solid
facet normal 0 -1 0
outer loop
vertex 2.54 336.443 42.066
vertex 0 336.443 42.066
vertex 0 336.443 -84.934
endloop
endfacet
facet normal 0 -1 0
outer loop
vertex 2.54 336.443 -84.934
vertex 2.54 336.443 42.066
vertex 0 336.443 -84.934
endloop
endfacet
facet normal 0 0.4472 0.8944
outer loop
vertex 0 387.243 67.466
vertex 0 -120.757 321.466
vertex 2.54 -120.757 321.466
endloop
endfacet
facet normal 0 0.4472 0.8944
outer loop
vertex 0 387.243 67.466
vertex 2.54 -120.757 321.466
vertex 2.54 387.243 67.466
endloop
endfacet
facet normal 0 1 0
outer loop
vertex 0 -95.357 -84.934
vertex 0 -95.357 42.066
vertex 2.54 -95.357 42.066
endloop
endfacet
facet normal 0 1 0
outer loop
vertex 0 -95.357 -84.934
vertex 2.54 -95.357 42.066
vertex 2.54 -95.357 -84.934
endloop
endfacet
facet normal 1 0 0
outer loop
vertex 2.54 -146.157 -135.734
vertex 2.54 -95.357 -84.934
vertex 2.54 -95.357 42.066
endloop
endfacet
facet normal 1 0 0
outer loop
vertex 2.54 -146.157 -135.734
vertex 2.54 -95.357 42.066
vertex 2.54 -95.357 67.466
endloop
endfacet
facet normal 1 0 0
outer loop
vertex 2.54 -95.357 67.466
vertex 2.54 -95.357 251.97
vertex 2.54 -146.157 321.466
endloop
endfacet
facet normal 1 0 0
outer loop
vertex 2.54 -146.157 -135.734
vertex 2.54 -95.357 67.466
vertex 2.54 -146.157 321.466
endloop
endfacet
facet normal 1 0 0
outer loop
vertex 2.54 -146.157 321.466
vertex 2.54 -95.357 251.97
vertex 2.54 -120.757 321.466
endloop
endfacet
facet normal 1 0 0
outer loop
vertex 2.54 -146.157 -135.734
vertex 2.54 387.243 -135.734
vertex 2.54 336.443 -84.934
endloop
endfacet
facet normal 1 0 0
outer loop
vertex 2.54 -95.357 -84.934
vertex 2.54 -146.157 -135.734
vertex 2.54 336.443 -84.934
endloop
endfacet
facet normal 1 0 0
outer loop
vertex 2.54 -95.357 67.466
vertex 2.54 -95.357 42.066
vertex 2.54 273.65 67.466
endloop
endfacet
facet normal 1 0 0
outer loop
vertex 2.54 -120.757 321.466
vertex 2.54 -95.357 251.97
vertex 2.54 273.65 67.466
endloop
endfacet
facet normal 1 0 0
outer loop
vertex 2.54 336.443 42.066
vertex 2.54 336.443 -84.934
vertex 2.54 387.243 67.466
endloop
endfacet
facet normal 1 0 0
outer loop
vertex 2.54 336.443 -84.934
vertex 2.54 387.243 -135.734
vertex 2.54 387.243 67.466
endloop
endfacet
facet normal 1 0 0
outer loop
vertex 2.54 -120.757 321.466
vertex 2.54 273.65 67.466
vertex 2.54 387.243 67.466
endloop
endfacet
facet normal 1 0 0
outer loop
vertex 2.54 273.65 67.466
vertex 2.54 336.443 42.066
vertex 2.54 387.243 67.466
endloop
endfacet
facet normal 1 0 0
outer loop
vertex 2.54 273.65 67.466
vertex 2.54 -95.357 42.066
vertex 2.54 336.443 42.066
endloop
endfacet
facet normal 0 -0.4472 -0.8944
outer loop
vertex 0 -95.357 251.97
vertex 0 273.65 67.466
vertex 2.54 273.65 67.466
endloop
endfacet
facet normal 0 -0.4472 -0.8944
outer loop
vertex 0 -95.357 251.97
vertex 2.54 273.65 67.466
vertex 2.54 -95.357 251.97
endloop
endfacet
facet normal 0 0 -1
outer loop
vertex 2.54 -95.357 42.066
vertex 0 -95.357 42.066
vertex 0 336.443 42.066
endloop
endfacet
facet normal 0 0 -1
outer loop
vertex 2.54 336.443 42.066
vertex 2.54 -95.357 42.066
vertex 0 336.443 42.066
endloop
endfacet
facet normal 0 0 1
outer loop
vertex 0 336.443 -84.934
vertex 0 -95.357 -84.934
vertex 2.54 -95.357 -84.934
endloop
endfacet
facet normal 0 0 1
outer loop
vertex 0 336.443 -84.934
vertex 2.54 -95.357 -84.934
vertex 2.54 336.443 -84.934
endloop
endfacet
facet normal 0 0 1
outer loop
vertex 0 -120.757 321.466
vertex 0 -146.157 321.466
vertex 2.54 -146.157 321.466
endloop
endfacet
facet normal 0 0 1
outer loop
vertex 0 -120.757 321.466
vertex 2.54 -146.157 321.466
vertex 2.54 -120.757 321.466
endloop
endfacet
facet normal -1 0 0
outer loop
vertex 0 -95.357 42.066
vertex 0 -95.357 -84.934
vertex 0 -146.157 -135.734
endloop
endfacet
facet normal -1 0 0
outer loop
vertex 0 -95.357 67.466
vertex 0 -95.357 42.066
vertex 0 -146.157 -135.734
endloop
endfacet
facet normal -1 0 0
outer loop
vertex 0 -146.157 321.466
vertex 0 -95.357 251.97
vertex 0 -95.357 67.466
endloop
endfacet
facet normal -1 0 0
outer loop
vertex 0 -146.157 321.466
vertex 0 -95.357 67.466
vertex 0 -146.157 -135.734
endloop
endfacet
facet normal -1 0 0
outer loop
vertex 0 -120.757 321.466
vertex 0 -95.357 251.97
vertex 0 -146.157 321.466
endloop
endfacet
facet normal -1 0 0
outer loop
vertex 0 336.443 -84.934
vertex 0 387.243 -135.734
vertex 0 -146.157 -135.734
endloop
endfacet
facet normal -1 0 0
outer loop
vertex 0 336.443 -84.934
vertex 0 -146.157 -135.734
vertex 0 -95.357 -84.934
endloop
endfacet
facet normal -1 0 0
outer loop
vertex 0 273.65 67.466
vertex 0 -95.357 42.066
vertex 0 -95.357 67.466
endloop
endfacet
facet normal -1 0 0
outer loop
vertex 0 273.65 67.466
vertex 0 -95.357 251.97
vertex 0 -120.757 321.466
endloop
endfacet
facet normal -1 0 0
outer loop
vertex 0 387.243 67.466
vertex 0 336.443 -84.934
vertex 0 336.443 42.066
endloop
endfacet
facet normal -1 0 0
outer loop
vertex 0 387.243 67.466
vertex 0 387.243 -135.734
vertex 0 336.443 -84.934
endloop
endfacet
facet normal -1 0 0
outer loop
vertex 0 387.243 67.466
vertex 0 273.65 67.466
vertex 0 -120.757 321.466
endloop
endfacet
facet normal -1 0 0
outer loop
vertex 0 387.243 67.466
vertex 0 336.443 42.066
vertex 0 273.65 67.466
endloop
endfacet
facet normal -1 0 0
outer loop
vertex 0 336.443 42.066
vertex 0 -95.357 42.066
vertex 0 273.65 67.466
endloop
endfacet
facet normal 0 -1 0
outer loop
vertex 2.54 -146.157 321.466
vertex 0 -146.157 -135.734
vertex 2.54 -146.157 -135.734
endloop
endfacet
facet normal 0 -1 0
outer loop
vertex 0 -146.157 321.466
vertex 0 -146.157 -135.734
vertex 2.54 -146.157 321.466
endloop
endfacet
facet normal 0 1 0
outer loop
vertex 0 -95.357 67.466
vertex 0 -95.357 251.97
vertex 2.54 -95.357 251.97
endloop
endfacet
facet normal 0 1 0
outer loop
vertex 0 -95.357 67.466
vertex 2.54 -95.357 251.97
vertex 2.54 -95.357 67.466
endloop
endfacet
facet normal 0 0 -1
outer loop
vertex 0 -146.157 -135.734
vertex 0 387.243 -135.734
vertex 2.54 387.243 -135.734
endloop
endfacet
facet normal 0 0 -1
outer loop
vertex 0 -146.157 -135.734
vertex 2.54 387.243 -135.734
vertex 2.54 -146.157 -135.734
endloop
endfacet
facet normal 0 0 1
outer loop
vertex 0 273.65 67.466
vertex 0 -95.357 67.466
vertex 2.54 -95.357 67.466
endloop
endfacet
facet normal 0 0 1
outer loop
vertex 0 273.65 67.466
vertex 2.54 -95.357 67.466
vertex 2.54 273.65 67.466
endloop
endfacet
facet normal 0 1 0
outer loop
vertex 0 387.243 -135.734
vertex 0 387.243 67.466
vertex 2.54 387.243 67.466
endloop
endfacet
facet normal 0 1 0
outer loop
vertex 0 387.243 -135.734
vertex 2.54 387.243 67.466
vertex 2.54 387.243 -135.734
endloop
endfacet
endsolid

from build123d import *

# Parameters (mm, degrees)
SKETCH1_W           = 127
SKETCH1_H           = 431.8
BOSS_EXTRUDE1_DEPTH = 2.54


with BuildPart() as part:
    # Sketch1 → Boss-Extrude1 (new body)
    with BuildSketch(Plane(origin=(0, 0, 0), x_dir=(0, 0, -1), z_dir=(1, 0, 0))):
        Polygon((-67.465907198, 387.242597926), (135.734092802, 387.242597926), (135.734092802, -146.157402074), (-321.465907198, -146.157402074), (-321.465907198, -120.757402074), align=None)
        with Locations((21.434092802, 120.542597926)):
            Rectangle(SKETCH1_W, SKETCH1_H, mode=Mode.SUBTRACT)
        Polygon((-67.465907198, 273.650344669), (-251.969780569, -95.357402074), (-67.465907198, -95.357402074), align=None, mode=Mode.SUBTRACT)
    extrude(amount=BOSS_EXTRUDE1_DEPTH)


solid = part.part
